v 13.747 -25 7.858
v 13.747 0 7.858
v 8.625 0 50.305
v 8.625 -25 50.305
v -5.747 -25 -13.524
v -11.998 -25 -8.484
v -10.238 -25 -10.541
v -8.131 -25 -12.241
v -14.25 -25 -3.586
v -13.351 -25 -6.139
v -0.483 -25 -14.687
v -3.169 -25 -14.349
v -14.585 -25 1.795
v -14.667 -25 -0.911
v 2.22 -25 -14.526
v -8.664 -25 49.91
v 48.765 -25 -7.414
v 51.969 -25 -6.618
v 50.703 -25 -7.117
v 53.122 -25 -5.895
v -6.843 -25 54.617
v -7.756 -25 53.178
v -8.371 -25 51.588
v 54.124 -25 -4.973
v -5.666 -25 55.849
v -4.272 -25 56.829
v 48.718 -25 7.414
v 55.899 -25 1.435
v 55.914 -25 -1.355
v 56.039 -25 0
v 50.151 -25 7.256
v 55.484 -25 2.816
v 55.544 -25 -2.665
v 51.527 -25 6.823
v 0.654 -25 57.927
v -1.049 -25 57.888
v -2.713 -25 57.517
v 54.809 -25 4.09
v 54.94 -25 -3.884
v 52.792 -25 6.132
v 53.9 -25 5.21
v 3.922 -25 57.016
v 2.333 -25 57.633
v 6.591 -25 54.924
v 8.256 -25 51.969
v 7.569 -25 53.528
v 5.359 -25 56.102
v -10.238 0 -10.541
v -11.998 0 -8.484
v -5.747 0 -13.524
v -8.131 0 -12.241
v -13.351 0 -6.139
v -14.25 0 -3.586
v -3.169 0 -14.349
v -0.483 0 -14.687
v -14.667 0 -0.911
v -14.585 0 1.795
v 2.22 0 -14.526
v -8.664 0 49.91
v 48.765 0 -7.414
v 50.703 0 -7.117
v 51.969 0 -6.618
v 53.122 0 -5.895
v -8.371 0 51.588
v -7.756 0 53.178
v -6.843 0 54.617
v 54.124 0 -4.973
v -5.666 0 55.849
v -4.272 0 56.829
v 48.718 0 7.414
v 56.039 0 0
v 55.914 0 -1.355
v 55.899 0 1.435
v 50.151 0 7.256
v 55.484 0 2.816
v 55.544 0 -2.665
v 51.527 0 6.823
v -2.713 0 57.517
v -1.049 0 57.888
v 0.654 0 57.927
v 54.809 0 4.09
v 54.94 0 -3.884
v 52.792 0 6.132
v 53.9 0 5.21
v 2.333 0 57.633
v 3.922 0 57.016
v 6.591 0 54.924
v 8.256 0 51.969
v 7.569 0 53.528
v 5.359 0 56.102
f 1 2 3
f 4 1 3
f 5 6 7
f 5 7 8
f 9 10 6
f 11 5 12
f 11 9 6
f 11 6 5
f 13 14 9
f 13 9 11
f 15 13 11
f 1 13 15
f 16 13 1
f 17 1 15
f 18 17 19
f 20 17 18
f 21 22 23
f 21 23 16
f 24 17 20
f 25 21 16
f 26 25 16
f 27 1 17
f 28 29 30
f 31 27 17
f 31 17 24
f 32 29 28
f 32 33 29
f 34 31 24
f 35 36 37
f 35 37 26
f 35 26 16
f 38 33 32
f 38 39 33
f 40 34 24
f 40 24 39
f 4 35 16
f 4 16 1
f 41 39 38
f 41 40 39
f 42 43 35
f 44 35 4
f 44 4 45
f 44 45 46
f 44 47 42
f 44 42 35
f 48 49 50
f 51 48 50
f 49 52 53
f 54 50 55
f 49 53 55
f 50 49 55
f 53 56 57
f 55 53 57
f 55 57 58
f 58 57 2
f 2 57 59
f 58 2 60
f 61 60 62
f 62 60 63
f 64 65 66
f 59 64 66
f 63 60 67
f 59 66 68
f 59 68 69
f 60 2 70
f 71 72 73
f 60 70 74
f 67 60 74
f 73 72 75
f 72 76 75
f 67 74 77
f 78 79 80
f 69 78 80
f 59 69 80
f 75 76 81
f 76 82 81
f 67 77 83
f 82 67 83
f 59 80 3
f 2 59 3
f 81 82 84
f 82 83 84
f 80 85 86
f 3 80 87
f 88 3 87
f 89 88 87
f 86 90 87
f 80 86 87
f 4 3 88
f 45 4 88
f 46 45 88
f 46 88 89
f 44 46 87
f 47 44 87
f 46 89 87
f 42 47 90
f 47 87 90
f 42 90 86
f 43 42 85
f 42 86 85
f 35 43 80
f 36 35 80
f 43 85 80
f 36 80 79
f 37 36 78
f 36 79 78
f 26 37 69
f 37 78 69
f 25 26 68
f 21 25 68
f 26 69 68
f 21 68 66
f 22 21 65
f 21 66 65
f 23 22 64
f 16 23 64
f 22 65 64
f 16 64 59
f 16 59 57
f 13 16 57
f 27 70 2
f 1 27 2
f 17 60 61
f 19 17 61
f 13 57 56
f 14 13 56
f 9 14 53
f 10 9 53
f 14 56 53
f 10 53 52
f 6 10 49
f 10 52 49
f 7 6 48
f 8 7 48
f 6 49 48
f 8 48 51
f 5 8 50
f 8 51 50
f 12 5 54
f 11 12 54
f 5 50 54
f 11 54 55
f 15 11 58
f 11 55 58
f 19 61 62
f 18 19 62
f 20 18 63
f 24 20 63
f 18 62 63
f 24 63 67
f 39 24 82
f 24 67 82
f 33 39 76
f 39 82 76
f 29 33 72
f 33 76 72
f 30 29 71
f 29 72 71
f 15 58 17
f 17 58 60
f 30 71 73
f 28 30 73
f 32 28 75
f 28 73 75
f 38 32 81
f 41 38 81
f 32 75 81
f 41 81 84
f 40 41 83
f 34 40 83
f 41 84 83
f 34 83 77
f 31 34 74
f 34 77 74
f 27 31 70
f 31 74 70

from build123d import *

# Parameters (mm, degrees)
F1_DEPTH = 25


with BuildPart() as f1:
    # F0 (on Front) → F1 (new body)
    with BuildSketch(Plane.XZ):
        with BuildLine():
            Line((13.74659, 7.85846), (8.625084, 50.304803))
            ThreePointArc((8.625084, 50.304803), (-0.198572, 57.949485), (-8.663633, 49.909534))
            Line((-8.663633, 49.909534), (-14.584756, 1.794839))
            ThreePointArc((-14.584756, 1.794839), (-10.238037, -10.541307), (2.219706, -14.526164))
            Line((2.219706, -14.526164), (48.765101, -7.413681))
            ThreePointArc((48.765101, -7.413681), (41.209057, -0.023461), (48.718184, 7.414425))
            Line((48.718184, 7.414425), (13.74659, 7.85846))
        make_face()
        with BuildLine():
            ThreePointArc((56.039065, 0), (53.900434, 5.209822), (48.718184, 7.414425))
            ThreePointArc((48.718184, 7.414425), (41.209057, -0.023461), (48.765101, -7.413681))
            Line((48.765101, -7.413681), (50.703455, -7.117486))
            ThreePointArc((50.703455, -7.117486), (54.557062, -4.447677), (56.039065, 0))
        make_face()
    extrude(amount=F1_DEPTH)


solid = f1.part
